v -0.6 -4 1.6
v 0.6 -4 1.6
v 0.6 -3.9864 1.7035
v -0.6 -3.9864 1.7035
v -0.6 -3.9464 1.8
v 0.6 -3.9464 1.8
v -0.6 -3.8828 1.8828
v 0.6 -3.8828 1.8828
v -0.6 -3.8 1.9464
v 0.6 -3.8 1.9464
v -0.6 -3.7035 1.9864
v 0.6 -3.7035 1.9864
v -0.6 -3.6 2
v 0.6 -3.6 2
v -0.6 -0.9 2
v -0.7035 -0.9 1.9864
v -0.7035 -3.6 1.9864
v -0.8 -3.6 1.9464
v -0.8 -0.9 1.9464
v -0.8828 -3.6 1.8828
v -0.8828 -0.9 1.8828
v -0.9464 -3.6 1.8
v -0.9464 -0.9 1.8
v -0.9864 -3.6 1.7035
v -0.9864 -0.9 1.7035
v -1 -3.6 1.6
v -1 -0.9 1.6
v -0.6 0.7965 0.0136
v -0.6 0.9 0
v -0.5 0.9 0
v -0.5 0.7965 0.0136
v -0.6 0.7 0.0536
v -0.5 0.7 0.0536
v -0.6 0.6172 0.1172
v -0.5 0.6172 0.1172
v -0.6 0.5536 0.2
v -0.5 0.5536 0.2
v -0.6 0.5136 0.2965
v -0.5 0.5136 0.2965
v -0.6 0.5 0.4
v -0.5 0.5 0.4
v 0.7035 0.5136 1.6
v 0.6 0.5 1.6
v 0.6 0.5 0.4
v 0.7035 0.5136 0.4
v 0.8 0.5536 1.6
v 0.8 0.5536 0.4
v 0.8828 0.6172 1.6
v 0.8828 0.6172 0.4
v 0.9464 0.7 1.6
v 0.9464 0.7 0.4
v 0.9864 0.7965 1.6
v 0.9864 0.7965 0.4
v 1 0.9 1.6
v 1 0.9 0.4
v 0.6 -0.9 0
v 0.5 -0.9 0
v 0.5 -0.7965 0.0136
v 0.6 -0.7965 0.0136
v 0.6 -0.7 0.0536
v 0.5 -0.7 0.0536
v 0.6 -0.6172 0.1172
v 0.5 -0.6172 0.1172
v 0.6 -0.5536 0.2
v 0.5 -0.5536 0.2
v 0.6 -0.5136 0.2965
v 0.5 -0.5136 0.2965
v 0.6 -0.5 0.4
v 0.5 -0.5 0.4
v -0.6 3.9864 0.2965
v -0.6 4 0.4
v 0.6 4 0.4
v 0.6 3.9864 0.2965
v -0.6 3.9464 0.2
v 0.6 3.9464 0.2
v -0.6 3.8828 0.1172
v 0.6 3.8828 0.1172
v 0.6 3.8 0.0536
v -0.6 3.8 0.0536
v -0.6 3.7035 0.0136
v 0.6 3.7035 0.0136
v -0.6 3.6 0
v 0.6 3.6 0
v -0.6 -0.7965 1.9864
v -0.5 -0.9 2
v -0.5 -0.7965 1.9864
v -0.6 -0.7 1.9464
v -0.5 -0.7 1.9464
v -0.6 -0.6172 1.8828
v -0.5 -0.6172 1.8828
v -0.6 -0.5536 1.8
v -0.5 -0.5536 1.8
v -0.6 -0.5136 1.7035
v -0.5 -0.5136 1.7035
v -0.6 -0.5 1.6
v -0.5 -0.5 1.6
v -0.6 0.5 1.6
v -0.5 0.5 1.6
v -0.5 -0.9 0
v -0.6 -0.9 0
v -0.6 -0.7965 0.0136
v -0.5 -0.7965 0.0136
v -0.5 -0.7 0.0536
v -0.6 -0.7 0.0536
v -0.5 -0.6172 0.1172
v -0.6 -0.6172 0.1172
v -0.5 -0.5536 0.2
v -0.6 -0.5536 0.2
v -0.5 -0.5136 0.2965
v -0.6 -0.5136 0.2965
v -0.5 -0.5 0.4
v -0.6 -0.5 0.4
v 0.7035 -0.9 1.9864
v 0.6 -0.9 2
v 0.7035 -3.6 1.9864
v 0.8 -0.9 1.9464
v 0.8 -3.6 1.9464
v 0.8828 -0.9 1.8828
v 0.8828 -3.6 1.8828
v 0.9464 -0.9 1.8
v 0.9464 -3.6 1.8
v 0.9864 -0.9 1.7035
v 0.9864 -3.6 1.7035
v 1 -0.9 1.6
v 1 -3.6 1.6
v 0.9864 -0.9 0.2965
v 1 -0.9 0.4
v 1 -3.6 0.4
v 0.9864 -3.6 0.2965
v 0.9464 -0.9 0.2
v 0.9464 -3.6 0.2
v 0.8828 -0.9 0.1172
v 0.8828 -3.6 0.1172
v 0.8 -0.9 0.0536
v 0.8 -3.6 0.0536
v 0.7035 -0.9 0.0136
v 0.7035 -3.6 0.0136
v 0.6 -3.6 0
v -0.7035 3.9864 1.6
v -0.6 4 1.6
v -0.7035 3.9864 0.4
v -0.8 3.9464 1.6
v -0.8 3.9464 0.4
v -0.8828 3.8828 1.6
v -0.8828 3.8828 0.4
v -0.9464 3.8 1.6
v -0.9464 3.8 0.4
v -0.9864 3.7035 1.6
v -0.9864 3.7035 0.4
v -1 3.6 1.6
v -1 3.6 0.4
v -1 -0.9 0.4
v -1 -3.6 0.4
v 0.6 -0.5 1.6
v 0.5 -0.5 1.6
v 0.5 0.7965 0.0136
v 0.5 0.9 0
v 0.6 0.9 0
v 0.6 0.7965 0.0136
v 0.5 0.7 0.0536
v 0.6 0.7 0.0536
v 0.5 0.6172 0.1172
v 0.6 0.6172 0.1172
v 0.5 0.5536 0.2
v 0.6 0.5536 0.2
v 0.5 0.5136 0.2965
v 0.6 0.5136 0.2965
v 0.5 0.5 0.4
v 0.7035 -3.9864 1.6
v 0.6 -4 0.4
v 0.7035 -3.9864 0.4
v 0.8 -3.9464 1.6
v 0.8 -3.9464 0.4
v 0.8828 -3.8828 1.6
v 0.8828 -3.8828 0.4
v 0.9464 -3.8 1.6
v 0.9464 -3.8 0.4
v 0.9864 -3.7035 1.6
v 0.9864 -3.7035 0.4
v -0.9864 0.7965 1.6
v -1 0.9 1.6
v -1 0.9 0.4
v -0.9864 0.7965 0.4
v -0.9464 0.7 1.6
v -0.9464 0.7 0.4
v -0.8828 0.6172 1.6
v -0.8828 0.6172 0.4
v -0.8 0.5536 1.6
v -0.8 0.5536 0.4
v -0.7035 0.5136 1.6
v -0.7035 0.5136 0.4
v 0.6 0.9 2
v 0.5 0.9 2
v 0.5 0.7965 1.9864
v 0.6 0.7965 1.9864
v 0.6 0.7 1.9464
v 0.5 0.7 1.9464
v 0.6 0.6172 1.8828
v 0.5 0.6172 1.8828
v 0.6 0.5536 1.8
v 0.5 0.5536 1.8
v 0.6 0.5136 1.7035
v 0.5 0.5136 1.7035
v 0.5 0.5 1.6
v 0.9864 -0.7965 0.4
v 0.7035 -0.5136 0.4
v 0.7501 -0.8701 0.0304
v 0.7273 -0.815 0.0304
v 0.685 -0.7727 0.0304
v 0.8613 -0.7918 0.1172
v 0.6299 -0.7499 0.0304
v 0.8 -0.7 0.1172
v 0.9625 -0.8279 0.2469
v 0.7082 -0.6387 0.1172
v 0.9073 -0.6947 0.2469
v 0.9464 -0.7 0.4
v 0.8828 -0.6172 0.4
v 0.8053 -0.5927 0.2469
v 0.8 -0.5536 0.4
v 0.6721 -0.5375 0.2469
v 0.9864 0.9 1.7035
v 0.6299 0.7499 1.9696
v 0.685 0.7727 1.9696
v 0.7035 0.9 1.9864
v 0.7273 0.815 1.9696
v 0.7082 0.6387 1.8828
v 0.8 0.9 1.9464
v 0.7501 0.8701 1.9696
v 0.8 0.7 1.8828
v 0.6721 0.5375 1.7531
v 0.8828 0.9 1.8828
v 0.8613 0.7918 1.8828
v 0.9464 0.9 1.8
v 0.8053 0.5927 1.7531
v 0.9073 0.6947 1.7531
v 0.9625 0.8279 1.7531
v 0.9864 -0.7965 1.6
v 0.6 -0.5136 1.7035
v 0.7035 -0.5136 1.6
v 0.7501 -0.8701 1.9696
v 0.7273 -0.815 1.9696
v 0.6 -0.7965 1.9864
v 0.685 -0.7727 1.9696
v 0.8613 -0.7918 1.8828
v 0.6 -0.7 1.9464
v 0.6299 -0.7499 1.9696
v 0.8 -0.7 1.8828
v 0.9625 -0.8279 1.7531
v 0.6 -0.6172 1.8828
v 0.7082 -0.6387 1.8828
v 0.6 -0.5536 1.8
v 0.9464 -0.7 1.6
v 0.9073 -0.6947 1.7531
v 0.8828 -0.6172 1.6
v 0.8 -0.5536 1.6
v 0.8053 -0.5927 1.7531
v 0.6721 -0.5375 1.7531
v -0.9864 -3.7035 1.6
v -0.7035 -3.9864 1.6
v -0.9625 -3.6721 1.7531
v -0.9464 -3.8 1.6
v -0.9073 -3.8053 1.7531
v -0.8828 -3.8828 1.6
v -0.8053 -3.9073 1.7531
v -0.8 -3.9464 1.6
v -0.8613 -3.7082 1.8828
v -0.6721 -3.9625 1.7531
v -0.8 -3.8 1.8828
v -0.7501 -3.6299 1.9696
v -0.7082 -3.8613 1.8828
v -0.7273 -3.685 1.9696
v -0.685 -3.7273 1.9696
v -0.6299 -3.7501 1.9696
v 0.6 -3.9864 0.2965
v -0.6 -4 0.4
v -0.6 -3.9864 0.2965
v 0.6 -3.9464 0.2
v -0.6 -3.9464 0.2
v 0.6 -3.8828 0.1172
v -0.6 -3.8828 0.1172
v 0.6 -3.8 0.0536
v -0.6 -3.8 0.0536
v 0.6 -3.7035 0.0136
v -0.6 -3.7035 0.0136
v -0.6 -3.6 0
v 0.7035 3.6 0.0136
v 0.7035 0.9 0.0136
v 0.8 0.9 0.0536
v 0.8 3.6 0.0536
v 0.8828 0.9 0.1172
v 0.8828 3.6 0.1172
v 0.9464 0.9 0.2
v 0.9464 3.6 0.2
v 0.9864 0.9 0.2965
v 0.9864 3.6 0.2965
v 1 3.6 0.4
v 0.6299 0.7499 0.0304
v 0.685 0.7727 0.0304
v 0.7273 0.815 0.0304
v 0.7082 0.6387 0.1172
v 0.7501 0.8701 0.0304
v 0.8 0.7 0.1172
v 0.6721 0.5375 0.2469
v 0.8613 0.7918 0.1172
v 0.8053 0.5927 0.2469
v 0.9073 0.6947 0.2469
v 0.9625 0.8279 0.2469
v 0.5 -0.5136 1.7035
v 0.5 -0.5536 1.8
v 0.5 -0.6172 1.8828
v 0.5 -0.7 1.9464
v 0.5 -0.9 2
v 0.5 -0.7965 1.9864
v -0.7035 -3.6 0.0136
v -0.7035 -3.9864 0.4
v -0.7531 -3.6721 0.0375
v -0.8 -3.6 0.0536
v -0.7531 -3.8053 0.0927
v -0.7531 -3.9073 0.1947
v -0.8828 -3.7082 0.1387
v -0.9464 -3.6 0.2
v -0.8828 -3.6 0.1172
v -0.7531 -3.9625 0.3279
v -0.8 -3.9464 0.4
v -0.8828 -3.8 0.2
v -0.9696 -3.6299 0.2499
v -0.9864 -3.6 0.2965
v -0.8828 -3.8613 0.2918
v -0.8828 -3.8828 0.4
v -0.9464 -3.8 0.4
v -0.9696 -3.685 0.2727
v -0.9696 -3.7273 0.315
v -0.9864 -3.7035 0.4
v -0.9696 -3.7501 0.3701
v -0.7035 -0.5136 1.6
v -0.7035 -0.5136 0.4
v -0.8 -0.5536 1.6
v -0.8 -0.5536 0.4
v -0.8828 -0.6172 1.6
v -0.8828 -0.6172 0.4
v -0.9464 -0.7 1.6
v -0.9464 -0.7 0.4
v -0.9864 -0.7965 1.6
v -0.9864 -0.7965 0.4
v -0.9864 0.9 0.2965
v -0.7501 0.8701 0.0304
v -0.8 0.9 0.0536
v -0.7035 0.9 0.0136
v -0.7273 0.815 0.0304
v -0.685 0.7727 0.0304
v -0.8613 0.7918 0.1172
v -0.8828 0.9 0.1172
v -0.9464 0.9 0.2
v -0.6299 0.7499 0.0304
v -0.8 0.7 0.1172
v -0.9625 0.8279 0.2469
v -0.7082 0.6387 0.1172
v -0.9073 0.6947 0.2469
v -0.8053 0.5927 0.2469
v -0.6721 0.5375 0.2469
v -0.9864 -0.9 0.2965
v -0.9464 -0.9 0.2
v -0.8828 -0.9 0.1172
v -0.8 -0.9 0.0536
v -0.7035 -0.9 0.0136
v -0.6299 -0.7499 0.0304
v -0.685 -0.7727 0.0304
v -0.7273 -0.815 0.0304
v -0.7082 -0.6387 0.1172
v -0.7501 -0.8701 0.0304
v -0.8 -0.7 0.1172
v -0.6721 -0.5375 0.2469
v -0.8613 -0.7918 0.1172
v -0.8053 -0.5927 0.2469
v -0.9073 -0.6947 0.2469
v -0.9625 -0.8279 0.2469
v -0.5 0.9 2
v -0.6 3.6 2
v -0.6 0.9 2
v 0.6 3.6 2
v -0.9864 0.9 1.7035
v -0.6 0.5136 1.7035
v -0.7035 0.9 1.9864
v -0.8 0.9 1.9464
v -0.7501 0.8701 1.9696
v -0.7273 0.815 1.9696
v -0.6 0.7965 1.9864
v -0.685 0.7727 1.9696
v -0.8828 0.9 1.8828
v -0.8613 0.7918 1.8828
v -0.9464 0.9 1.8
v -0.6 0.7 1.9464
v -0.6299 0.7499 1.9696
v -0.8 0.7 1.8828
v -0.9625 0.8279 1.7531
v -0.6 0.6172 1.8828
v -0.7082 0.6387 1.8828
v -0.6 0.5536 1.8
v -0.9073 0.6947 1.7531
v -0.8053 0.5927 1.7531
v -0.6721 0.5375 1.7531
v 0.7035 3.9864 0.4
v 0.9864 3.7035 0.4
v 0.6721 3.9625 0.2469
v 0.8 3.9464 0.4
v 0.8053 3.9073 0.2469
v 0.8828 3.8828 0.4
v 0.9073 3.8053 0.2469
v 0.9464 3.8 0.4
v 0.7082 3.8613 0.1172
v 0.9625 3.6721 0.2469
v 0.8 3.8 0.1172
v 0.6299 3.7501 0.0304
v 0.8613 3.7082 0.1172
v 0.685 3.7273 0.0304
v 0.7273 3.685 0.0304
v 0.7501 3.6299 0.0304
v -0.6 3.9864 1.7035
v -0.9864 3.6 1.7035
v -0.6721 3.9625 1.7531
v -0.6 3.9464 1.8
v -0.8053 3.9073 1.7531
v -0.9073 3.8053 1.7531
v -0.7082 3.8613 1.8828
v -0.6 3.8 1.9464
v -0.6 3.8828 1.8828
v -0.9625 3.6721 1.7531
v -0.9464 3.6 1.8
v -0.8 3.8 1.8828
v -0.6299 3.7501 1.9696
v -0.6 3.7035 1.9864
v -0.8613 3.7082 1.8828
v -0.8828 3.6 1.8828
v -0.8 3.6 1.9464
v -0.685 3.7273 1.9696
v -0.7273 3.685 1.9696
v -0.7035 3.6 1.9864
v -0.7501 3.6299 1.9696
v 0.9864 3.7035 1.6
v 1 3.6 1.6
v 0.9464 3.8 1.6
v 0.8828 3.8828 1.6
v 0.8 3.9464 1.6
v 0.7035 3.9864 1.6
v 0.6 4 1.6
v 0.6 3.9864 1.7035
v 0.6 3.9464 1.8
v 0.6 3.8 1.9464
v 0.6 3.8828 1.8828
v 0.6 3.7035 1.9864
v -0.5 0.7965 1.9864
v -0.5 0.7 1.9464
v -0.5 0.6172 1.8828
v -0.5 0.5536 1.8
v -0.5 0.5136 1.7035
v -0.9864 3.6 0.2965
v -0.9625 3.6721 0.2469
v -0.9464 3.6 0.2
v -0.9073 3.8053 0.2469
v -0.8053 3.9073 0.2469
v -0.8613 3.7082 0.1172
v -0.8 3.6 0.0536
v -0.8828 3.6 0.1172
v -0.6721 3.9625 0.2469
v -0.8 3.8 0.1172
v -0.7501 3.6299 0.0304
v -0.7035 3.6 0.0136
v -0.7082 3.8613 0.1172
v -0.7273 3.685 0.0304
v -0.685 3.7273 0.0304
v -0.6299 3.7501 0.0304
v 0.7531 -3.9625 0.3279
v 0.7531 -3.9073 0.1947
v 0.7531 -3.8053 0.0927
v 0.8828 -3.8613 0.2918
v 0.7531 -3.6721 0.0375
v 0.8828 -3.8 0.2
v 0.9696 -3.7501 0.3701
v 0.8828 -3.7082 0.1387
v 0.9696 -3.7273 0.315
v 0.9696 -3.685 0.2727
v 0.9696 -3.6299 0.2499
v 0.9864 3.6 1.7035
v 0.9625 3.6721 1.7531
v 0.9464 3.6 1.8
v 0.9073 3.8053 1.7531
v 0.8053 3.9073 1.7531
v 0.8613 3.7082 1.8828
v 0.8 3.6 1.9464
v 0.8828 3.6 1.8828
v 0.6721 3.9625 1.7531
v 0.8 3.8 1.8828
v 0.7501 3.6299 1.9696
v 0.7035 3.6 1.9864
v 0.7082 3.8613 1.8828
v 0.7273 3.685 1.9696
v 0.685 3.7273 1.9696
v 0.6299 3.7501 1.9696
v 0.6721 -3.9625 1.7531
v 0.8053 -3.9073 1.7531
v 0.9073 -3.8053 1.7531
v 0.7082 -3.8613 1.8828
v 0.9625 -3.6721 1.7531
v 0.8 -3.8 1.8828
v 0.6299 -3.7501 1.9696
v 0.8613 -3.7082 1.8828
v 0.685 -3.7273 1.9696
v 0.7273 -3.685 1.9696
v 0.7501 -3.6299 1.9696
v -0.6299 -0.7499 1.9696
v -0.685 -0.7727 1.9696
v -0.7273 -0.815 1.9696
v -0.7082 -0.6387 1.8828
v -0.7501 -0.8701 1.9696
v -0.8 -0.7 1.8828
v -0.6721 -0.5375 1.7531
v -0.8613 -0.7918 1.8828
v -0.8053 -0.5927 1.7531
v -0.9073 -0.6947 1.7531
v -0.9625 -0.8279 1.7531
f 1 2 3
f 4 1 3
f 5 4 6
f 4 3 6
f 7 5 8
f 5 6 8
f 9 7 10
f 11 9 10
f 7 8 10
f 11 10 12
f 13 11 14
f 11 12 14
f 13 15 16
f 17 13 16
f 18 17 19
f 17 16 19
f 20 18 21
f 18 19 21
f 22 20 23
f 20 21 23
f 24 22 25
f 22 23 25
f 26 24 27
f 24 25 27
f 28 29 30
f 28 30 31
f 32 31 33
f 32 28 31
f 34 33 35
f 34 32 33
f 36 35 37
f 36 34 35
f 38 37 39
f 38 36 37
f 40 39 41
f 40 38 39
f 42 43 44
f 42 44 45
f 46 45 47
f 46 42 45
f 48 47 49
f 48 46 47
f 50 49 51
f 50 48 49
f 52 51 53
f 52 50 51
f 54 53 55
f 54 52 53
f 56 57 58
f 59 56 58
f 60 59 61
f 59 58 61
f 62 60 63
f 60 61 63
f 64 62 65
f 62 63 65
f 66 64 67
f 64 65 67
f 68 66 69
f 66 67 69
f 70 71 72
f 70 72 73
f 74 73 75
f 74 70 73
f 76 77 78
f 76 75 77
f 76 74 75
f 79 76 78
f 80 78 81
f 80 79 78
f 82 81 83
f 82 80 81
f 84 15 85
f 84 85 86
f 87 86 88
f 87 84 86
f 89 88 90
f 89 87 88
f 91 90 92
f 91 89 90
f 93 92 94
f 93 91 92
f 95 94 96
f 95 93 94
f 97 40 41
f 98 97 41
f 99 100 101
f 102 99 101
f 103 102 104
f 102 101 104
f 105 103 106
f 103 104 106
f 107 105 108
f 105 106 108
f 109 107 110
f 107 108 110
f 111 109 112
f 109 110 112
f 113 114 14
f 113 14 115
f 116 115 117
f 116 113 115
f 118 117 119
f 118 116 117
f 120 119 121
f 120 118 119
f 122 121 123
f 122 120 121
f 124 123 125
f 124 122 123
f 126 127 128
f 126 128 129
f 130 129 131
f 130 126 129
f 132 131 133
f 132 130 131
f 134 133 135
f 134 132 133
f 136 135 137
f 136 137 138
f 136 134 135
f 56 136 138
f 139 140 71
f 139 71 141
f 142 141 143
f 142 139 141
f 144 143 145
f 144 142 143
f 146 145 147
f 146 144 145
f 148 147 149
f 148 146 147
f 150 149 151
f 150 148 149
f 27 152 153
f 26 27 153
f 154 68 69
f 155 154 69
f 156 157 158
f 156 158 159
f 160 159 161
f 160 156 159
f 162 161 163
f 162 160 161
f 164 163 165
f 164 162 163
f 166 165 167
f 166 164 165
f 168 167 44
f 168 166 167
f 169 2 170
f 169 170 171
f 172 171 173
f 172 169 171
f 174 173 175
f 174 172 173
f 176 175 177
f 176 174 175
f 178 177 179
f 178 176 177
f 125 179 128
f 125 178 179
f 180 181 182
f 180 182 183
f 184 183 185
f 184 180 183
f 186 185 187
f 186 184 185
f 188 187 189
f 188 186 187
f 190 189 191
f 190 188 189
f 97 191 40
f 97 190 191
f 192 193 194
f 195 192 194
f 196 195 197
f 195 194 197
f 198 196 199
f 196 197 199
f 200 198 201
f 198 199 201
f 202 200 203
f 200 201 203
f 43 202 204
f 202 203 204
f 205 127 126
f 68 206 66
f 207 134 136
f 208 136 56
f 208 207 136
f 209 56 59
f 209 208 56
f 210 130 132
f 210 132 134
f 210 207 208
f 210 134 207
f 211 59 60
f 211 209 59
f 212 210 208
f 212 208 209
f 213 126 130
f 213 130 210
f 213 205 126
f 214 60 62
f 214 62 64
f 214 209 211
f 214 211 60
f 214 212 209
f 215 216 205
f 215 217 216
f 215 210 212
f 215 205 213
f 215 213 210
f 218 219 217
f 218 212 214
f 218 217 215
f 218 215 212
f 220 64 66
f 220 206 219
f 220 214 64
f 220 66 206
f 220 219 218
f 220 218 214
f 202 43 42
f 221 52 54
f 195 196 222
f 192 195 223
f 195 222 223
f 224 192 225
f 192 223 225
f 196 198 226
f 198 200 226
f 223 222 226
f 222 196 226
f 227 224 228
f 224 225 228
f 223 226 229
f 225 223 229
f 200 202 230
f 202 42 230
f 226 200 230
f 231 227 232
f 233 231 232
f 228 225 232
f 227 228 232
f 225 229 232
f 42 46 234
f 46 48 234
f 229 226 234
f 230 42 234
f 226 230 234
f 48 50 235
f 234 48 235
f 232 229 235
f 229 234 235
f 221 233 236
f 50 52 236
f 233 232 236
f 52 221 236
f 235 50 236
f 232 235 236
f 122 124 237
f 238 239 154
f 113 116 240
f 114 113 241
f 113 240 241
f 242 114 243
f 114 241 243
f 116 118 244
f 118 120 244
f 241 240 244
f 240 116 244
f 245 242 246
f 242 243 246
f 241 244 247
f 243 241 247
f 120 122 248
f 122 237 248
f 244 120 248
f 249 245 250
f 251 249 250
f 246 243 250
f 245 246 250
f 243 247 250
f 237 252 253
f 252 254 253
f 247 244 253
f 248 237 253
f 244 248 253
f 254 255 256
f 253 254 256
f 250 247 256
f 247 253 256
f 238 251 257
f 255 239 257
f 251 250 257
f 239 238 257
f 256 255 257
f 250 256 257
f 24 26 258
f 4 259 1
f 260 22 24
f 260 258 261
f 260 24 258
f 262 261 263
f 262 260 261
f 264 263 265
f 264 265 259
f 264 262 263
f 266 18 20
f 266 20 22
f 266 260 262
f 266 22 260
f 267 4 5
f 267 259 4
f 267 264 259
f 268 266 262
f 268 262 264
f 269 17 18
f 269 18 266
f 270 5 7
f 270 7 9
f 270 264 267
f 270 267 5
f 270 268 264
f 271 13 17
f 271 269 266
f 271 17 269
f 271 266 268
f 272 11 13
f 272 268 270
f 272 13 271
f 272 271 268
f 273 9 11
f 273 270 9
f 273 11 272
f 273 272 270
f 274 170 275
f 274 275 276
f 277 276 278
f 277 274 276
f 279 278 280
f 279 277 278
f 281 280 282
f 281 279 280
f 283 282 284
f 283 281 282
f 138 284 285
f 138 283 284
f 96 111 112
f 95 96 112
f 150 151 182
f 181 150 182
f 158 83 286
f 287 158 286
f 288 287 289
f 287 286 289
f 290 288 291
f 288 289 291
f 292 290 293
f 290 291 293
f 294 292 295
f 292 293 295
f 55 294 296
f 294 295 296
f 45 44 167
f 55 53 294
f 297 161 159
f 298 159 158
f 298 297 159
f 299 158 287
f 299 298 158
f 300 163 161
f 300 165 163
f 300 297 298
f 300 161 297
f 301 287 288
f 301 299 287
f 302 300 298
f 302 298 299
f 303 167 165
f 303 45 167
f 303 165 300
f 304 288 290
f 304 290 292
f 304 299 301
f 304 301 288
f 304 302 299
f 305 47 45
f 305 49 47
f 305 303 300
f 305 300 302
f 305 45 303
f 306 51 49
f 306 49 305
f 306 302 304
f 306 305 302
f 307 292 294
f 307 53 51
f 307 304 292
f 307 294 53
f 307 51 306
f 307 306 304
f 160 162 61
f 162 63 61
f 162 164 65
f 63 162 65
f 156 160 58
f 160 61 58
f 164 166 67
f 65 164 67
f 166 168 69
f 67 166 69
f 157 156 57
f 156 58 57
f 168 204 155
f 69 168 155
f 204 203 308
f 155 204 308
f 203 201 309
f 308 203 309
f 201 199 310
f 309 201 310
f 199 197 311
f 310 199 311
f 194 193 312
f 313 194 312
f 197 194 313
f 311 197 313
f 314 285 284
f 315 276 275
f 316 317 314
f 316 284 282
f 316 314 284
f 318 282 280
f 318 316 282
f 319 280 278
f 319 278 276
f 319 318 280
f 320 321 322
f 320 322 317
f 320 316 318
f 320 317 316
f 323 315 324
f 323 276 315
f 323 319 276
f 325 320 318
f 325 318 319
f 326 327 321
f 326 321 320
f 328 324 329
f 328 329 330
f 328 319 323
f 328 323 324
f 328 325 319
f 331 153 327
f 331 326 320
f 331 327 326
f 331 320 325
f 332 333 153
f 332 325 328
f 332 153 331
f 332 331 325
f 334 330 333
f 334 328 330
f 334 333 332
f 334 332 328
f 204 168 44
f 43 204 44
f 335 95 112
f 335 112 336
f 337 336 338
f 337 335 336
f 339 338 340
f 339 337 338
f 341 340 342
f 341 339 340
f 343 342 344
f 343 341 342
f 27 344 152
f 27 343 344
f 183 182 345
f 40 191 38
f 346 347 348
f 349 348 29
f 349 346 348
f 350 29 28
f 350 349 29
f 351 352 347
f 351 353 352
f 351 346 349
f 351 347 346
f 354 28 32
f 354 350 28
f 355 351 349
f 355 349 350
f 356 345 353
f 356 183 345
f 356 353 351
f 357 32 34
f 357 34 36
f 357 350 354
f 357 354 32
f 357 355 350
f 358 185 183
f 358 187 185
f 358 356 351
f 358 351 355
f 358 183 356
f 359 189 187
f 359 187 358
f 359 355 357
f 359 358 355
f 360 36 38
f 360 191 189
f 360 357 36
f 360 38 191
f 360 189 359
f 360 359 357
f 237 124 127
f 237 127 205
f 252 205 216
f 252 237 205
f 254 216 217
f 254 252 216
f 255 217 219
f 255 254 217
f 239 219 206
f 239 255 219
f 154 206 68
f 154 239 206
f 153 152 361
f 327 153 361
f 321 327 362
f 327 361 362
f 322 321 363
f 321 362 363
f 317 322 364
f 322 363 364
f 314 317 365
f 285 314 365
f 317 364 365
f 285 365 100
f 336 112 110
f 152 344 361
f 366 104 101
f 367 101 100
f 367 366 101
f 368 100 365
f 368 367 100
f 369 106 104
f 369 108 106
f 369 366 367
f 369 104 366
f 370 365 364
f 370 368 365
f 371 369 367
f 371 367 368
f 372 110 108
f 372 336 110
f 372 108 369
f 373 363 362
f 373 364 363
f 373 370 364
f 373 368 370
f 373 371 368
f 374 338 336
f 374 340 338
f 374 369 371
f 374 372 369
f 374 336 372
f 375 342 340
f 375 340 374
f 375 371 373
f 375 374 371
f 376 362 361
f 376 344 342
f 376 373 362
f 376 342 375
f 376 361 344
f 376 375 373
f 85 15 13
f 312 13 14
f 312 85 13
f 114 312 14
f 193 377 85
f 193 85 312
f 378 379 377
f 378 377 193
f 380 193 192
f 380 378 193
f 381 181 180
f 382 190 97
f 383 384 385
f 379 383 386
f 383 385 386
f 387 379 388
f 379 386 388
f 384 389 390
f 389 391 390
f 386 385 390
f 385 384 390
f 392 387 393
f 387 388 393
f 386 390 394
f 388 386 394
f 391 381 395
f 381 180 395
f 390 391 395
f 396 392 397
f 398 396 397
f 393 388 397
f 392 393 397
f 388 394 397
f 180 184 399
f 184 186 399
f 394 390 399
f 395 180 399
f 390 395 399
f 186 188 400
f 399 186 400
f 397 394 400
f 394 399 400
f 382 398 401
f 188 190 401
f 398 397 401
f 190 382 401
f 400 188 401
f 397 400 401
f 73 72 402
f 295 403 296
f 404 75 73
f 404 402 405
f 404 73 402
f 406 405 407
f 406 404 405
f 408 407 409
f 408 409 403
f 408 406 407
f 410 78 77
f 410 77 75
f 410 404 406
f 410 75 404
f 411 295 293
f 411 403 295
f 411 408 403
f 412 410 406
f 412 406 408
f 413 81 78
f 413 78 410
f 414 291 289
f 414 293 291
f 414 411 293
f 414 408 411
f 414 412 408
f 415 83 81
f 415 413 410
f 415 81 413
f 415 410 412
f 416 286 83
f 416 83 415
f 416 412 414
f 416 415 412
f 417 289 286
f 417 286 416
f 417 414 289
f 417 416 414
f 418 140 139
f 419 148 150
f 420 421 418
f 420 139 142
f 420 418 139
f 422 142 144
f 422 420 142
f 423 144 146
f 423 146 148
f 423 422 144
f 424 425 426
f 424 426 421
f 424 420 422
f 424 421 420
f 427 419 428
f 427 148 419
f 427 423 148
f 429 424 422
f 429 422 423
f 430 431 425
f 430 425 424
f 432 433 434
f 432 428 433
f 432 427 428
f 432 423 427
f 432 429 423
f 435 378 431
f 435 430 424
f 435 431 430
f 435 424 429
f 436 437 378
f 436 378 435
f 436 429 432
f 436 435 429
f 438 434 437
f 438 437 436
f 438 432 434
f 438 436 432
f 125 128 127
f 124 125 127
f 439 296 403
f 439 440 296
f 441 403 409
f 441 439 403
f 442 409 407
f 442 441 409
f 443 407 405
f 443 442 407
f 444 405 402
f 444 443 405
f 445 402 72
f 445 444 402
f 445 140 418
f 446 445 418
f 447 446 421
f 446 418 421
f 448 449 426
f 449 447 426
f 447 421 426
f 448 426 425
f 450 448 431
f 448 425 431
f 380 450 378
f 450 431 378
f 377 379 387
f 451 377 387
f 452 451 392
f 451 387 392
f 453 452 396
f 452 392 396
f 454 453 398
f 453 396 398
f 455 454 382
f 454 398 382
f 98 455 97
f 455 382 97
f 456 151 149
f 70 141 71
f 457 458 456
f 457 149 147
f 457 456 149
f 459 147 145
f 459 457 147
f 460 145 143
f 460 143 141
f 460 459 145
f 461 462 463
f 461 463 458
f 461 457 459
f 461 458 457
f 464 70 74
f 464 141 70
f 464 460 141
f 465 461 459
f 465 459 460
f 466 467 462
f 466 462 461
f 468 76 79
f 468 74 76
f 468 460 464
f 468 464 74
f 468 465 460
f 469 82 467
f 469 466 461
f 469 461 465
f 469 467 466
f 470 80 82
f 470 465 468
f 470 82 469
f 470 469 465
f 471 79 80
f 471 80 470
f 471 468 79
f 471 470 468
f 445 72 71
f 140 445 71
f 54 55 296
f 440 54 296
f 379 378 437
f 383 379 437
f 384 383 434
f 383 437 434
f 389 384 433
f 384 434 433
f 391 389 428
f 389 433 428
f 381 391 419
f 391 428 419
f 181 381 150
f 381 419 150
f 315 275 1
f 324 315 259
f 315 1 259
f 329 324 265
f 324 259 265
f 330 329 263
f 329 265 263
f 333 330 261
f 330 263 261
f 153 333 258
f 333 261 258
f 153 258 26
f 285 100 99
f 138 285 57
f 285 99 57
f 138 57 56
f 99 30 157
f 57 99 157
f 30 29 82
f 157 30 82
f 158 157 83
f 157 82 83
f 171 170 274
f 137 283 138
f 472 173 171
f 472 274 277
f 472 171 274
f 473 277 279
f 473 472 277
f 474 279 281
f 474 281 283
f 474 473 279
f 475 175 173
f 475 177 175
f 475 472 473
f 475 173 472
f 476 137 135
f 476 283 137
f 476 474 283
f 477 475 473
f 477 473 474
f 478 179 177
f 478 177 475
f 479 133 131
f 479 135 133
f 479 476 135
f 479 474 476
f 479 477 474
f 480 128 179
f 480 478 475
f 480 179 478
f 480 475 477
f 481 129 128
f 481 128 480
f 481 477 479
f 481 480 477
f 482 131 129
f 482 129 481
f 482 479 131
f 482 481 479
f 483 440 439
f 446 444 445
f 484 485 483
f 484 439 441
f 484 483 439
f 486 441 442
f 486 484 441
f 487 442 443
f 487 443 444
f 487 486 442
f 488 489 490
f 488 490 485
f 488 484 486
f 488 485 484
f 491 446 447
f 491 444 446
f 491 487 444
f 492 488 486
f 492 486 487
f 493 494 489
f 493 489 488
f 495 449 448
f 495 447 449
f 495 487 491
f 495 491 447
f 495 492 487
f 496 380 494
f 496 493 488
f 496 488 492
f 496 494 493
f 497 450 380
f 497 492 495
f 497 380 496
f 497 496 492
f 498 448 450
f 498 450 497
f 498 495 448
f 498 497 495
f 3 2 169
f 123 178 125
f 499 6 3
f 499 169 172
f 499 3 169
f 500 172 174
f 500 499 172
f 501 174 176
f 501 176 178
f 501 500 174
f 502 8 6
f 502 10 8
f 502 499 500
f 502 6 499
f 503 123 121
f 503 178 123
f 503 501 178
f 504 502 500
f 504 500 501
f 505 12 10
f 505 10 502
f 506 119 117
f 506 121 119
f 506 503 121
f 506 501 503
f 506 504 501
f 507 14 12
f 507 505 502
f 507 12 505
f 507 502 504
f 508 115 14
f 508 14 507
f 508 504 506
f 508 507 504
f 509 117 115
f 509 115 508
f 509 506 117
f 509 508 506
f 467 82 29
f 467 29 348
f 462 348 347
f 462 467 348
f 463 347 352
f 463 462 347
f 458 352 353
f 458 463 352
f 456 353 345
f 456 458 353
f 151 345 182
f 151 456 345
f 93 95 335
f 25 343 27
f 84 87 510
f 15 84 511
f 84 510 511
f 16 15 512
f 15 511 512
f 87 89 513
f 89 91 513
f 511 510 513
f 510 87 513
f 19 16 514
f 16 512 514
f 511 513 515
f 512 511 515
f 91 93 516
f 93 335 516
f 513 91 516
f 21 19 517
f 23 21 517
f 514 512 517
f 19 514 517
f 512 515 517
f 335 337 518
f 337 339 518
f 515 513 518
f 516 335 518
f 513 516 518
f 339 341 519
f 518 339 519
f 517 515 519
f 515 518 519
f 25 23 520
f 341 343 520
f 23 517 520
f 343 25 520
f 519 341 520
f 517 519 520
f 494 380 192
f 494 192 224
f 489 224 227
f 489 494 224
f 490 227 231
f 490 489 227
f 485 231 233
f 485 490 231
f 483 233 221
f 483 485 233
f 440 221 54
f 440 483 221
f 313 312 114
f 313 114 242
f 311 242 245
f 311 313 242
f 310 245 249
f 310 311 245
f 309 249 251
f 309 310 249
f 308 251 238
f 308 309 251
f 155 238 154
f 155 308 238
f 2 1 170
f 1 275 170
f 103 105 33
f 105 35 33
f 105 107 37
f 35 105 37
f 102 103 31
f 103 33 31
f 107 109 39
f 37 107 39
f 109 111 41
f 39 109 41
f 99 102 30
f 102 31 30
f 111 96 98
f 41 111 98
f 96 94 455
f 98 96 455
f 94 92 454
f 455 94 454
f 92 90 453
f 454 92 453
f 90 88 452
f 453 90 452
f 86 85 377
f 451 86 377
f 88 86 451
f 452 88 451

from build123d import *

# Parameters (mm, degrees)
F1_DEPTH     = 2
F2_R         = 0.4
F3_T1_DEPTH  = 2.7
F3_T3_DEPTH  = 2.7
F3_T5_DEPTH  = 0.1
F3_T7_DEPTH  = 0.1
F3_S11_W     = 0.4
F3_S11_H     = 0.4
F3_T12_DEPTH = 0.4
F3_S17_W     = 0.4
F3_S17_H     = 0.4
F3_T18_DEPTH = 0.4
F3_S23_W     = 0.4
F3_S23_H     = 0.4
F3_T24_DEPTH = 0.4
F3_S29_W     = 0.4
F3_S29_H     = 0.4
F3_T30_DEPTH = 0.4
F3_S35_W     = 0.4
F3_S35_H     = 0.4
F3_T36_DEPTH = 0.4
F3_S41_W     = 0.4
F3_S41_H     = 0.4
F3_T42_DEPTH = 0.4
F3_S47_W     = 0.4
F3_S47_H     = 0.4
F3_T48_DEPTH = 0.4
F3_S53_W     = 0.4
F3_S53_H     = 0.4
F3_T54_DEPTH = 0.4
F3_T58_ANGLE = 90
F3_T60_ANGLE = 90
F3_T62_ANGLE = 90
F3_T64_ANGLE = 90
F3_T66_ANGLE = 90
F3_T68_ANGLE = 90
F3_T70_ANGLE = 90
F3_T72_ANGLE = 90


# Not quite as in the source:
# - a fillet or chamfer that OpenCascade refuses, or shapes differently, is made with other operations: its cross-section is extruded or revolved along the edge and cut away or added


with BuildPart() as f1:
    # F0 (on Top) → F1 (new body)
    with BuildSketch(Plane.XY):
        Polygon((-1, -4), (1, -4), (1, -0.5), (0.5, -0.5), (0.5, 0.5), (1, 0.5), (1, 4), (-1, 4), (-1, 0.5), (-0.5, 0.5), (-0.5, -0.5), (-1, -0.5), align=None)
    extrude(amount=F1_DEPTH)

    # F2
    f2_edges = [f1.edges().sort_by_distance(p)[0] for p in [
        (0, -4, 2),
        (1, -4, 1),
        (-1, -4, 1),
        (0, -4, 0),
        (1, 4, 1),
        (0, 4, 2),
        (-1, 4, 1),
        (0, 4, 0),
        (1, 0.5, 1),
        (1, -0.5, 1),
        (-1, 0.5, 1),
        (-1, -0.5, 1),
    ]]
    fillet(f2_edges, radius=F2_R)

    # F3: fillet of radius 0.4 on 8 edges, made by hand

    # F3_s2 → F3_t1 (cut)
    with BuildSketch(Plane.XZ.offset(0.9)):
        with BuildLine():
            ThreePointArc((0.6, 2), (0.8828427125, 1.8828427125), (1, 1.6))
            Line((1, 1.6), (1, 2))
            Line((1, 2), (0.6, 2))
        make_face()
        with BuildLine():
            ThreePointArc((1, 0.4), (0.8828427125, 0.1171572875), (0.6, 0))
            Line((0.6, 0), (1, 0))
            Line((1, 0), (1, 0.4))
        make_face()
        with BuildLine():
            ThreePointArc((-0.6, 2), (-0.8828427125, 1.8828427125), (-1, 1.6))
            Line((-1, 1.6), (-1, 2))
            Line((-1, 2), (-0.6, 2))
        make_face()
        with BuildLine():
            ThreePointArc((-1, 0.4), (-0.8828427125, 0.1171572875), (-0.6, 0))
            Line((-0.6, 0), (-1, 0))
            Line((-1, 0), (-1, 0.4))
        make_face()
    extrude(amount=F3_T1_DEPTH, mode=Mode.SUBTRACT)

    # F3_s4 → F3_t3 (cut)
    with BuildSketch(Plane.XZ.offset(-3.6)):
        with BuildLine():
            ThreePointArc((0.6, 2), (0.8828427125, 1.8828427125), (1, 1.6))
            Line((1, 1.6), (1, 2))
            Line((1, 2), (0.6, 2))
        make_face()
        with BuildLine():
            ThreePointArc((0.6, 0), (0.8828427125, 0.1171572875), (1, 0.4))
            Line((1, 0.4), (1, 0))
            Line((1, 0), (0.6, 0))
        make_face()
        with BuildLine():
            ThreePointArc((-0.6, 2), (-0.8828427125, 1.8828427125), (-1, 1.6))
            Line((-1, 1.6), (-1, 2))
            Line((-1, 2), (-0.6, 2))
        make_face()
        with BuildLine():
            ThreePointArc((-0.6, 0), (-0.8828427125, 0.1171572875), (-1, 0.4))
            Line((-1, 0.4), (-1, 0))
            Line((-1, 0), (-0.6, 0))
        make_face()
    extrude(amount=F3_T3_DEPTH, mode=Mode.SUBTRACT)

    # F3_s6 → F3_t5 (cut)
    with BuildSketch(Plane.YZ.offset(-0.6)):
        with BuildLine():
            ThreePointArc((0.9, 0), (0.6171572875, 0.1171572875), (0.5, 0.4))
            Line((0.5, 0.4), (0.5, 0))
            Line((0.5, 0), (0.9, 0))
        make_face()
        with BuildLine():
            ThreePointArc((-0.9, 0), (-0.6171572875, 0.1171572875), (-0.5, 0.4))
            Line((-0.5, 0.4), (-0.5, 0))
            Line((-0.5, 0), (-0.9, 0))
        make_face()
        with BuildLine():
            ThreePointArc((0.9, 2), (0.6171572875, 1.8828427125), (0.5, 1.6))
            Line((0.5, 1.6), (0.5, 2))
            Line((0.5, 2), (0.9, 2))
        make_face()
        with BuildLine():
            ThreePointArc((-0.9, 2), (-0.6171572875, 1.8828427125), (-0.5, 1.6))
            Line((-0.5, 1.6), (-0.5, 2))
            Line((-0.5, 2), (-0.9, 2))
        make_face()
    extrude(amount=F3_T5_DEPTH, mode=Mode.SUBTRACT)

    # F3_s8 → F3_t7 (cut)
    with BuildSketch(Plane.YZ.offset(0.5)):
        with BuildLine():
            ThreePointArc((0.9, 0), (0.6171572875, 0.1171572875), (0.5, 0.4))
            Line((0.5, 0.4), (0.5, 0))
            Line((0.5, 0), (0.9, 0))
        make_face()
        with BuildLine():
            ThreePointArc((0.9, 2), (0.6171572875, 1.8828427125), (0.5, 1.6))
            Line((0.5, 1.6), (0.5, 2))
            Line((0.5, 2), (0.9, 2))
        make_face()
        with BuildLine():
            ThreePointArc((-0.9, 0), (-0.6171572875, 0.1171572875), (-0.5, 0.4))
            Line((-0.5, 0.4), (-0.5, 0))
            Line((-0.5, 0), (-0.9, 0))
        make_face()
        with BuildLine():
            ThreePointArc((-0.9, 2), (-0.6171572875, 1.8828427125), (-0.5, 1.6))
            Line((-0.5, 1.6), (-0.5, 2))
            Line((-0.5, 2), (-0.9, 2))
        make_face()
    extrude(amount=F3_T7_DEPTH, mode=Mode.SUBTRACT)


with BuildPart() as f3_tool10:
    # F3_s11 → F3_t12 (new body)
    with BuildSketch(Plane.XY.offset(0.4)):
        with Locations((-0.8, 3.8)):
            Rectangle(F3_S11_W, F3_S11_H)
    extrude(amount=-F3_T12_DEPTH)

    # F3_s13 → F3_t14 (revolve, cut)
    with BuildSketch(Plane(origin=(-0.6, 3.6, 0.4), x_dir=(0.7071067812, -0.7071067812, 0), z_dir=(0.7071067812, 0.7071067812, 0))):
        with BuildLine():
            ThreePointArc((0, -0.4), (0.4, 0), (0, 0.4))
            Line((0, 0.4), (0, -0.4))
        make_face()
    revolve(axis=Axis((-0.6, 3.6, 0.4), (0, 0, -1)), mode=Mode.SUBTRACT)


with BuildPart() as f1_1:
    add(f1.part)

    # F3_t9: cut F3_tool10
    add(f3_tool10.part, mode=Mode.SUBTRACT)


with BuildPart() as f3_tool16:
    # F3_s17 → F3_t18 (new body)
    with BuildSketch(Plane.YZ.offset(-0.6)):
        with Locations((-3.8, 0.2)):
            Rectangle(F3_S17_W, F3_S17_H)
    extrude(amount=-F3_T18_DEPTH)

    # F3_s19 → F3_t20 (revolve, cut)
    with BuildSketch(Plane(origin=(-0.6, -3.6, 0.4), x_dir=(0, 0.7071067812, 0.7071067812), z_dir=(0, -0.7071067812, 0.7071067812))):
        with BuildLine():
            ThreePointArc((0, -0.4), (0.4, 0), (0, 0.4))
            Line((0, 0.4), (0, -0.4))
        make_face()
    revolve(axis=Axis((-0.6, -3.6, 0.4), (-1, 0, 0)), mode=Mode.SUBTRACT)


with BuildPart() as f1_2:
    add(f1_1.part)

    # F3_t15: cut F3_tool16
    add(f3_tool16.part, mode=Mode.SUBTRACT)


with BuildPart() as f3_tool22:
    # F3_s23 → F3_t24 (new body)
    with BuildSketch(Plane.XY.offset(1.6)):
        with Locations((-0.8, 3.8)):
            Rectangle(F3_S23_W, F3_S23_H)
    extrude(amount=F3_T24_DEPTH)

    # F3_s25 → F3_t26 (revolve, cut)
    with BuildSketch(Plane(origin=(-0.6, 3.6, 1.6), x_dir=(0.7071067812, -0.7071067812, 0), z_dir=(-0.7071067812, -0.7071067812, 0))):
        with BuildLine():
            ThreePointArc((0, -0.4), (0.4, 0), (0, 0.4))
            Line((0, 0.4), (0, -0.4))
        make_face()
    revolve(axis=Axis((-0.6, 3.6, 1.6), (0, 0, 1)), mode=Mode.SUBTRACT)


with BuildPart() as f1_3:
    add(f1_2.part)

    # F3_t21: cut F3_tool22
    add(f3_tool22.part, mode=Mode.SUBTRACT)


with BuildPart() as f3_tool28:
    # F3_s29 → F3_t30 (new body)
    with BuildSketch(Plane.XY.offset(1.6)):
        with Locations((-0.8, -3.8)):
            Rectangle(F3_S29_W, F3_S29_H)
    extrude(amount=F3_T30_DEPTH)

    # F3_s31 → F3_t32 (revolve, cut)
    with BuildSketch(Plane(origin=(-0.6, -3.6, 1.6), x_dir=(0.7071067812, 0.7071067812, 0), z_dir=(0.7071067812, -0.7071067812, 0))):
        with BuildLine():
            ThreePointArc((0, -0.4), (0.4, 0), (0, 0.4))
            Line((0, 0.4), (0, -0.4))
        make_face()
    revolve(axis=Axis((-0.6, -3.6, 1.6), (0, 0, 1)), mode=Mode.SUBTRACT)


with BuildPart() as f1_4:
    add(f1_3.part)

    # F3_t27: cut F3_tool28
    add(f3_tool28.part, mode=Mode.SUBTRACT)


with BuildPart() as f3_tool34:
    # F3_s35 → F3_t36 (new body)
    with BuildSketch(Plane.XY.offset(0.4)):
        with Locations((0.8, 3.8)):
            Rectangle(F3_S35_W, F3_S35_H)
    extrude(amount=-F3_T36_DEPTH)

    # F3_s37 → F3_t38 (revolve, cut)
    with BuildSketch(Plane(origin=(0.6, 3.6, 0.4), x_dir=(-0.7071067812, -0.7071067812, 0), z_dir=(0.7071067812, -0.7071067812, 0))):
        with BuildLine():
            ThreePointArc((0, -0.4), (0.4, 0), (0, 0.4))
            Line((0, 0.4), (0, -0.4))
        make_face()
    revolve(axis=Axis((0.6, 3.6, 0.4), (0, 0, -1)), mode=Mode.SUBTRACT)


with BuildPart() as f1_5:
    add(f1_4.part)

    # F3_t33: cut F3_tool34
    add(f3_tool34.part, mode=Mode.SUBTRACT)


with BuildPart() as f3_tool40:
    # F3_s41 → F3_t42 (new body)
    with BuildSketch(Plane.XY.offset(1.6)):
        with Locations((0.8, 3.8)):
            Rectangle(F3_S41_W, F3_S41_H)
    extrude(amount=F3_T42_DEPTH)

    # F3_s43 → F3_t44 (revolve, cut)
    with BuildSketch(Plane(origin=(0.6, 3.6, 1.6), x_dir=(-0.7071067812, -0.7071067812, 0), z_dir=(-0.7071067812, 0.7071067812, 0))):
        with BuildLine():
            ThreePointArc((0, -0.4), (0.4, 0), (0, 0.4))
            Line((0, 0.4), (0, -0.4))
        make_face()
    revolve(axis=Axis((0.6, 3.6, 1.6), (0, 0, 1)), mode=Mode.SUBTRACT)


with BuildPart() as f1_6:
    add(f1_5.part)

    # F3_t39: cut F3_tool40
    add(f3_tool40.part, mode=Mode.SUBTRACT)


with BuildPart() as f3_tool46:
    # F3_s47 → F3_t48 (new body)
    with BuildSketch(Plane.YZ.offset(0.6)):
        with Locations((-3.8, 0.2)):
            Rectangle(F3_S47_W, F3_S47_H)
    extrude(amount=F3_T48_DEPTH)

    # F3_s49 → F3_t50 (revolve, cut)
    with BuildSketch(Plane(origin=(0.6, -3.6, 0.4), x_dir=(0, 0.7071067812, 0.7071067812), z_dir=(0, 0.7071067812, -0.7071067812))):
        with BuildLine():
            ThreePointArc((0, -0.4), (0.4, 0), (0, 0.4))
            Line((0, 0.4), (0, -0.4))
        make_face()
    revolve(axis=Axis((0.6, -3.6, 0.4), (1, 0, 0)), mode=Mode.SUBTRACT)


with BuildPart() as f1_7:
    add(f1_6.part)

    # F3_t45: cut F3_tool46
    add(f3_tool46.part, mode=Mode.SUBTRACT)


with BuildPart() as f3_tool52:
    # F3_s53 → F3_t54 (new body)
    with BuildSketch(Plane.XY.offset(1.6)):
        with Locations((0.8, -3.8)):
            Rectangle(F3_S53_W, F3_S53_H)
    extrude(amount=F3_T54_DEPTH)

    # F3_s55 → F3_t56 (revolve, cut)
    with BuildSketch(Plane(origin=(0.6, -3.6, 1.6), x_dir=(-0.7071067812, 0.7071067812, 0), z_dir=(0.7071067812, 0.7071067812, 0))):
        with BuildLine():
            ThreePointArc((0, -0.4), (0.4, 0), (0, 0.4))
            Line((0, 0.4), (0, -0.4))
        make_face()
    revolve(axis=Axis((0.6, -3.6, 1.6), (0, 0, 1)), mode=Mode.SUBTRACT)


with BuildPart() as f1_8:
    add(f1_7.part)

    # F3_t51: cut F3_tool52
    add(f3_tool52.part, mode=Mode.SUBTRACT)

    # F3_s57 → F3_t58 (revolve, cut)
    with BuildSketch(Plane.XZ.offset(-0.9)):
        with BuildLine():
            ThreePointArc((-0.6, 0), (-0.8828427125, 0.1171572875), (-1, 0.4))
            Line((-1, 0.4), (-1, 0))
            Line((-1, 0), (-0.6, 0))
        make_face()
    revolve(axis=Axis((-0.6, 0.9, 0), (0, 0, 1)), revolution_arc=F3_T58_ANGLE, mode=Mode.SUBTRACT)

    # F3_s59 → F3_t60 (revolve, cut)
    with BuildSketch(Plane.YZ.offset(-0.6)):
        with BuildLine():
            ThreePointArc((-0.9, 0), (-0.6171572875, 0.1171572875), (-0.5, 0.4))
            Line((-0.5, 0.4), (-0.5, 0))
            Line((-0.5, 0), (-0.9, 0))
        make_face()
    revolve(axis=Axis((-0.6, -0.9, 0), (0, 0, 1)), revolution_arc=F3_T60_ANGLE, mode=Mode.SUBTRACT)

    # F3_s61 → F3_t62 (revolve, cut)
    with BuildSketch(Plane.XZ.offset(-0.9)):
        with BuildLine():
            ThreePointArc((-0.6, 2), (-0.8828427125, 1.8828427125), (-1, 1.6))
            Line((-1, 1.6), (-1, 2))
            Line((-1, 2), (-0.6, 2))
        make_face()
    revolve(axis=Axis((-0.6, 0.9, 2), (0, 0, 1)), revolution_arc=F3_T62_ANGLE, mode=Mode.SUBTRACT)

    # F3_s63 → F3_t64 (revolve, cut)
    with BuildSketch(Plane.YZ.offset(-0.6)):
        with BuildLine():
            ThreePointArc((-0.9, 2), (-0.6171572875, 1.8828427125), (-0.5, 1.6))
            Line((-0.5, 1.6), (-0.5, 2))
            Line((-0.5, 2), (-0.9, 2))
        make_face()
    revolve(axis=Axis((-0.6, -0.9, 2), (0, 0, 1)), revolution_arc=F3_T64_ANGLE, mode=Mode.SUBTRACT)

    # F3_s65 → F3_t66 (revolve, cut)
    with BuildSketch(Plane.YZ.offset(0.6)):
        with BuildLine():
            ThreePointArc((0.9, 0), (0.6171572875, 0.1171572875), (0.5, 0.4))
            Line((0.5, 0.4), (0.5, 0))
            Line((0.5, 0), (0.9, 0))
        make_face()
    revolve(axis=Axis((0.6, 0.9, 0), (0, 0, 1)), revolution_arc=F3_T66_ANGLE, mode=Mode.SUBTRACT)

    # F3_s67 → F3_t68 (revolve, cut)
    with BuildSketch(Plane.YZ.offset(0.6)):
        with BuildLine():
            ThreePointArc((0.9, 2), (0.6171572875, 1.8828427125), (0.5, 1.6))
            Line((0.5, 1.6), (0.5, 2))
            Line((0.5, 2), (0.9, 2))
        make_face()
    revolve(axis=Axis((0.6, 0.9, 2), (0, 0, 1)), revolution_arc=F3_T68_ANGLE, mode=Mode.SUBTRACT)

    # F3_s69 → F3_t70 (revolve, cut)
    with BuildSketch(Plane.XZ.offset(0.9)):
        with BuildLine():
            ThreePointArc((0.6, 0), (0.8828427125, 0.1171572875), (1, 0.4))
            Line((1, 0.4), (1, 0))
            Line((1, 0), (0.6, 0))
        make_face()
    revolve(axis=Axis((0.6, -0.9, 0), (0, 0, 1)), revolution_arc=F3_T70_ANGLE, mode=Mode.SUBTRACT)

    # F3_s71 → F3_t72 (revolve, cut)
    with BuildSketch(Plane.XZ.offset(0.9)):
        with BuildLine():
            ThreePointArc((0.6, 2), (0.8828427125, 1.8828427125), (1, 1.6))
            Line((1, 1.6), (1, 2))
            Line((1, 2), (0.6, 2))
        make_face()
    revolve(axis=Axis((0.6, -0.9, 2), (0, 0, 1)), revolution_arc=F3_T72_ANGLE, mode=Mode.SUBTRACT)


solid = f1_8.part
